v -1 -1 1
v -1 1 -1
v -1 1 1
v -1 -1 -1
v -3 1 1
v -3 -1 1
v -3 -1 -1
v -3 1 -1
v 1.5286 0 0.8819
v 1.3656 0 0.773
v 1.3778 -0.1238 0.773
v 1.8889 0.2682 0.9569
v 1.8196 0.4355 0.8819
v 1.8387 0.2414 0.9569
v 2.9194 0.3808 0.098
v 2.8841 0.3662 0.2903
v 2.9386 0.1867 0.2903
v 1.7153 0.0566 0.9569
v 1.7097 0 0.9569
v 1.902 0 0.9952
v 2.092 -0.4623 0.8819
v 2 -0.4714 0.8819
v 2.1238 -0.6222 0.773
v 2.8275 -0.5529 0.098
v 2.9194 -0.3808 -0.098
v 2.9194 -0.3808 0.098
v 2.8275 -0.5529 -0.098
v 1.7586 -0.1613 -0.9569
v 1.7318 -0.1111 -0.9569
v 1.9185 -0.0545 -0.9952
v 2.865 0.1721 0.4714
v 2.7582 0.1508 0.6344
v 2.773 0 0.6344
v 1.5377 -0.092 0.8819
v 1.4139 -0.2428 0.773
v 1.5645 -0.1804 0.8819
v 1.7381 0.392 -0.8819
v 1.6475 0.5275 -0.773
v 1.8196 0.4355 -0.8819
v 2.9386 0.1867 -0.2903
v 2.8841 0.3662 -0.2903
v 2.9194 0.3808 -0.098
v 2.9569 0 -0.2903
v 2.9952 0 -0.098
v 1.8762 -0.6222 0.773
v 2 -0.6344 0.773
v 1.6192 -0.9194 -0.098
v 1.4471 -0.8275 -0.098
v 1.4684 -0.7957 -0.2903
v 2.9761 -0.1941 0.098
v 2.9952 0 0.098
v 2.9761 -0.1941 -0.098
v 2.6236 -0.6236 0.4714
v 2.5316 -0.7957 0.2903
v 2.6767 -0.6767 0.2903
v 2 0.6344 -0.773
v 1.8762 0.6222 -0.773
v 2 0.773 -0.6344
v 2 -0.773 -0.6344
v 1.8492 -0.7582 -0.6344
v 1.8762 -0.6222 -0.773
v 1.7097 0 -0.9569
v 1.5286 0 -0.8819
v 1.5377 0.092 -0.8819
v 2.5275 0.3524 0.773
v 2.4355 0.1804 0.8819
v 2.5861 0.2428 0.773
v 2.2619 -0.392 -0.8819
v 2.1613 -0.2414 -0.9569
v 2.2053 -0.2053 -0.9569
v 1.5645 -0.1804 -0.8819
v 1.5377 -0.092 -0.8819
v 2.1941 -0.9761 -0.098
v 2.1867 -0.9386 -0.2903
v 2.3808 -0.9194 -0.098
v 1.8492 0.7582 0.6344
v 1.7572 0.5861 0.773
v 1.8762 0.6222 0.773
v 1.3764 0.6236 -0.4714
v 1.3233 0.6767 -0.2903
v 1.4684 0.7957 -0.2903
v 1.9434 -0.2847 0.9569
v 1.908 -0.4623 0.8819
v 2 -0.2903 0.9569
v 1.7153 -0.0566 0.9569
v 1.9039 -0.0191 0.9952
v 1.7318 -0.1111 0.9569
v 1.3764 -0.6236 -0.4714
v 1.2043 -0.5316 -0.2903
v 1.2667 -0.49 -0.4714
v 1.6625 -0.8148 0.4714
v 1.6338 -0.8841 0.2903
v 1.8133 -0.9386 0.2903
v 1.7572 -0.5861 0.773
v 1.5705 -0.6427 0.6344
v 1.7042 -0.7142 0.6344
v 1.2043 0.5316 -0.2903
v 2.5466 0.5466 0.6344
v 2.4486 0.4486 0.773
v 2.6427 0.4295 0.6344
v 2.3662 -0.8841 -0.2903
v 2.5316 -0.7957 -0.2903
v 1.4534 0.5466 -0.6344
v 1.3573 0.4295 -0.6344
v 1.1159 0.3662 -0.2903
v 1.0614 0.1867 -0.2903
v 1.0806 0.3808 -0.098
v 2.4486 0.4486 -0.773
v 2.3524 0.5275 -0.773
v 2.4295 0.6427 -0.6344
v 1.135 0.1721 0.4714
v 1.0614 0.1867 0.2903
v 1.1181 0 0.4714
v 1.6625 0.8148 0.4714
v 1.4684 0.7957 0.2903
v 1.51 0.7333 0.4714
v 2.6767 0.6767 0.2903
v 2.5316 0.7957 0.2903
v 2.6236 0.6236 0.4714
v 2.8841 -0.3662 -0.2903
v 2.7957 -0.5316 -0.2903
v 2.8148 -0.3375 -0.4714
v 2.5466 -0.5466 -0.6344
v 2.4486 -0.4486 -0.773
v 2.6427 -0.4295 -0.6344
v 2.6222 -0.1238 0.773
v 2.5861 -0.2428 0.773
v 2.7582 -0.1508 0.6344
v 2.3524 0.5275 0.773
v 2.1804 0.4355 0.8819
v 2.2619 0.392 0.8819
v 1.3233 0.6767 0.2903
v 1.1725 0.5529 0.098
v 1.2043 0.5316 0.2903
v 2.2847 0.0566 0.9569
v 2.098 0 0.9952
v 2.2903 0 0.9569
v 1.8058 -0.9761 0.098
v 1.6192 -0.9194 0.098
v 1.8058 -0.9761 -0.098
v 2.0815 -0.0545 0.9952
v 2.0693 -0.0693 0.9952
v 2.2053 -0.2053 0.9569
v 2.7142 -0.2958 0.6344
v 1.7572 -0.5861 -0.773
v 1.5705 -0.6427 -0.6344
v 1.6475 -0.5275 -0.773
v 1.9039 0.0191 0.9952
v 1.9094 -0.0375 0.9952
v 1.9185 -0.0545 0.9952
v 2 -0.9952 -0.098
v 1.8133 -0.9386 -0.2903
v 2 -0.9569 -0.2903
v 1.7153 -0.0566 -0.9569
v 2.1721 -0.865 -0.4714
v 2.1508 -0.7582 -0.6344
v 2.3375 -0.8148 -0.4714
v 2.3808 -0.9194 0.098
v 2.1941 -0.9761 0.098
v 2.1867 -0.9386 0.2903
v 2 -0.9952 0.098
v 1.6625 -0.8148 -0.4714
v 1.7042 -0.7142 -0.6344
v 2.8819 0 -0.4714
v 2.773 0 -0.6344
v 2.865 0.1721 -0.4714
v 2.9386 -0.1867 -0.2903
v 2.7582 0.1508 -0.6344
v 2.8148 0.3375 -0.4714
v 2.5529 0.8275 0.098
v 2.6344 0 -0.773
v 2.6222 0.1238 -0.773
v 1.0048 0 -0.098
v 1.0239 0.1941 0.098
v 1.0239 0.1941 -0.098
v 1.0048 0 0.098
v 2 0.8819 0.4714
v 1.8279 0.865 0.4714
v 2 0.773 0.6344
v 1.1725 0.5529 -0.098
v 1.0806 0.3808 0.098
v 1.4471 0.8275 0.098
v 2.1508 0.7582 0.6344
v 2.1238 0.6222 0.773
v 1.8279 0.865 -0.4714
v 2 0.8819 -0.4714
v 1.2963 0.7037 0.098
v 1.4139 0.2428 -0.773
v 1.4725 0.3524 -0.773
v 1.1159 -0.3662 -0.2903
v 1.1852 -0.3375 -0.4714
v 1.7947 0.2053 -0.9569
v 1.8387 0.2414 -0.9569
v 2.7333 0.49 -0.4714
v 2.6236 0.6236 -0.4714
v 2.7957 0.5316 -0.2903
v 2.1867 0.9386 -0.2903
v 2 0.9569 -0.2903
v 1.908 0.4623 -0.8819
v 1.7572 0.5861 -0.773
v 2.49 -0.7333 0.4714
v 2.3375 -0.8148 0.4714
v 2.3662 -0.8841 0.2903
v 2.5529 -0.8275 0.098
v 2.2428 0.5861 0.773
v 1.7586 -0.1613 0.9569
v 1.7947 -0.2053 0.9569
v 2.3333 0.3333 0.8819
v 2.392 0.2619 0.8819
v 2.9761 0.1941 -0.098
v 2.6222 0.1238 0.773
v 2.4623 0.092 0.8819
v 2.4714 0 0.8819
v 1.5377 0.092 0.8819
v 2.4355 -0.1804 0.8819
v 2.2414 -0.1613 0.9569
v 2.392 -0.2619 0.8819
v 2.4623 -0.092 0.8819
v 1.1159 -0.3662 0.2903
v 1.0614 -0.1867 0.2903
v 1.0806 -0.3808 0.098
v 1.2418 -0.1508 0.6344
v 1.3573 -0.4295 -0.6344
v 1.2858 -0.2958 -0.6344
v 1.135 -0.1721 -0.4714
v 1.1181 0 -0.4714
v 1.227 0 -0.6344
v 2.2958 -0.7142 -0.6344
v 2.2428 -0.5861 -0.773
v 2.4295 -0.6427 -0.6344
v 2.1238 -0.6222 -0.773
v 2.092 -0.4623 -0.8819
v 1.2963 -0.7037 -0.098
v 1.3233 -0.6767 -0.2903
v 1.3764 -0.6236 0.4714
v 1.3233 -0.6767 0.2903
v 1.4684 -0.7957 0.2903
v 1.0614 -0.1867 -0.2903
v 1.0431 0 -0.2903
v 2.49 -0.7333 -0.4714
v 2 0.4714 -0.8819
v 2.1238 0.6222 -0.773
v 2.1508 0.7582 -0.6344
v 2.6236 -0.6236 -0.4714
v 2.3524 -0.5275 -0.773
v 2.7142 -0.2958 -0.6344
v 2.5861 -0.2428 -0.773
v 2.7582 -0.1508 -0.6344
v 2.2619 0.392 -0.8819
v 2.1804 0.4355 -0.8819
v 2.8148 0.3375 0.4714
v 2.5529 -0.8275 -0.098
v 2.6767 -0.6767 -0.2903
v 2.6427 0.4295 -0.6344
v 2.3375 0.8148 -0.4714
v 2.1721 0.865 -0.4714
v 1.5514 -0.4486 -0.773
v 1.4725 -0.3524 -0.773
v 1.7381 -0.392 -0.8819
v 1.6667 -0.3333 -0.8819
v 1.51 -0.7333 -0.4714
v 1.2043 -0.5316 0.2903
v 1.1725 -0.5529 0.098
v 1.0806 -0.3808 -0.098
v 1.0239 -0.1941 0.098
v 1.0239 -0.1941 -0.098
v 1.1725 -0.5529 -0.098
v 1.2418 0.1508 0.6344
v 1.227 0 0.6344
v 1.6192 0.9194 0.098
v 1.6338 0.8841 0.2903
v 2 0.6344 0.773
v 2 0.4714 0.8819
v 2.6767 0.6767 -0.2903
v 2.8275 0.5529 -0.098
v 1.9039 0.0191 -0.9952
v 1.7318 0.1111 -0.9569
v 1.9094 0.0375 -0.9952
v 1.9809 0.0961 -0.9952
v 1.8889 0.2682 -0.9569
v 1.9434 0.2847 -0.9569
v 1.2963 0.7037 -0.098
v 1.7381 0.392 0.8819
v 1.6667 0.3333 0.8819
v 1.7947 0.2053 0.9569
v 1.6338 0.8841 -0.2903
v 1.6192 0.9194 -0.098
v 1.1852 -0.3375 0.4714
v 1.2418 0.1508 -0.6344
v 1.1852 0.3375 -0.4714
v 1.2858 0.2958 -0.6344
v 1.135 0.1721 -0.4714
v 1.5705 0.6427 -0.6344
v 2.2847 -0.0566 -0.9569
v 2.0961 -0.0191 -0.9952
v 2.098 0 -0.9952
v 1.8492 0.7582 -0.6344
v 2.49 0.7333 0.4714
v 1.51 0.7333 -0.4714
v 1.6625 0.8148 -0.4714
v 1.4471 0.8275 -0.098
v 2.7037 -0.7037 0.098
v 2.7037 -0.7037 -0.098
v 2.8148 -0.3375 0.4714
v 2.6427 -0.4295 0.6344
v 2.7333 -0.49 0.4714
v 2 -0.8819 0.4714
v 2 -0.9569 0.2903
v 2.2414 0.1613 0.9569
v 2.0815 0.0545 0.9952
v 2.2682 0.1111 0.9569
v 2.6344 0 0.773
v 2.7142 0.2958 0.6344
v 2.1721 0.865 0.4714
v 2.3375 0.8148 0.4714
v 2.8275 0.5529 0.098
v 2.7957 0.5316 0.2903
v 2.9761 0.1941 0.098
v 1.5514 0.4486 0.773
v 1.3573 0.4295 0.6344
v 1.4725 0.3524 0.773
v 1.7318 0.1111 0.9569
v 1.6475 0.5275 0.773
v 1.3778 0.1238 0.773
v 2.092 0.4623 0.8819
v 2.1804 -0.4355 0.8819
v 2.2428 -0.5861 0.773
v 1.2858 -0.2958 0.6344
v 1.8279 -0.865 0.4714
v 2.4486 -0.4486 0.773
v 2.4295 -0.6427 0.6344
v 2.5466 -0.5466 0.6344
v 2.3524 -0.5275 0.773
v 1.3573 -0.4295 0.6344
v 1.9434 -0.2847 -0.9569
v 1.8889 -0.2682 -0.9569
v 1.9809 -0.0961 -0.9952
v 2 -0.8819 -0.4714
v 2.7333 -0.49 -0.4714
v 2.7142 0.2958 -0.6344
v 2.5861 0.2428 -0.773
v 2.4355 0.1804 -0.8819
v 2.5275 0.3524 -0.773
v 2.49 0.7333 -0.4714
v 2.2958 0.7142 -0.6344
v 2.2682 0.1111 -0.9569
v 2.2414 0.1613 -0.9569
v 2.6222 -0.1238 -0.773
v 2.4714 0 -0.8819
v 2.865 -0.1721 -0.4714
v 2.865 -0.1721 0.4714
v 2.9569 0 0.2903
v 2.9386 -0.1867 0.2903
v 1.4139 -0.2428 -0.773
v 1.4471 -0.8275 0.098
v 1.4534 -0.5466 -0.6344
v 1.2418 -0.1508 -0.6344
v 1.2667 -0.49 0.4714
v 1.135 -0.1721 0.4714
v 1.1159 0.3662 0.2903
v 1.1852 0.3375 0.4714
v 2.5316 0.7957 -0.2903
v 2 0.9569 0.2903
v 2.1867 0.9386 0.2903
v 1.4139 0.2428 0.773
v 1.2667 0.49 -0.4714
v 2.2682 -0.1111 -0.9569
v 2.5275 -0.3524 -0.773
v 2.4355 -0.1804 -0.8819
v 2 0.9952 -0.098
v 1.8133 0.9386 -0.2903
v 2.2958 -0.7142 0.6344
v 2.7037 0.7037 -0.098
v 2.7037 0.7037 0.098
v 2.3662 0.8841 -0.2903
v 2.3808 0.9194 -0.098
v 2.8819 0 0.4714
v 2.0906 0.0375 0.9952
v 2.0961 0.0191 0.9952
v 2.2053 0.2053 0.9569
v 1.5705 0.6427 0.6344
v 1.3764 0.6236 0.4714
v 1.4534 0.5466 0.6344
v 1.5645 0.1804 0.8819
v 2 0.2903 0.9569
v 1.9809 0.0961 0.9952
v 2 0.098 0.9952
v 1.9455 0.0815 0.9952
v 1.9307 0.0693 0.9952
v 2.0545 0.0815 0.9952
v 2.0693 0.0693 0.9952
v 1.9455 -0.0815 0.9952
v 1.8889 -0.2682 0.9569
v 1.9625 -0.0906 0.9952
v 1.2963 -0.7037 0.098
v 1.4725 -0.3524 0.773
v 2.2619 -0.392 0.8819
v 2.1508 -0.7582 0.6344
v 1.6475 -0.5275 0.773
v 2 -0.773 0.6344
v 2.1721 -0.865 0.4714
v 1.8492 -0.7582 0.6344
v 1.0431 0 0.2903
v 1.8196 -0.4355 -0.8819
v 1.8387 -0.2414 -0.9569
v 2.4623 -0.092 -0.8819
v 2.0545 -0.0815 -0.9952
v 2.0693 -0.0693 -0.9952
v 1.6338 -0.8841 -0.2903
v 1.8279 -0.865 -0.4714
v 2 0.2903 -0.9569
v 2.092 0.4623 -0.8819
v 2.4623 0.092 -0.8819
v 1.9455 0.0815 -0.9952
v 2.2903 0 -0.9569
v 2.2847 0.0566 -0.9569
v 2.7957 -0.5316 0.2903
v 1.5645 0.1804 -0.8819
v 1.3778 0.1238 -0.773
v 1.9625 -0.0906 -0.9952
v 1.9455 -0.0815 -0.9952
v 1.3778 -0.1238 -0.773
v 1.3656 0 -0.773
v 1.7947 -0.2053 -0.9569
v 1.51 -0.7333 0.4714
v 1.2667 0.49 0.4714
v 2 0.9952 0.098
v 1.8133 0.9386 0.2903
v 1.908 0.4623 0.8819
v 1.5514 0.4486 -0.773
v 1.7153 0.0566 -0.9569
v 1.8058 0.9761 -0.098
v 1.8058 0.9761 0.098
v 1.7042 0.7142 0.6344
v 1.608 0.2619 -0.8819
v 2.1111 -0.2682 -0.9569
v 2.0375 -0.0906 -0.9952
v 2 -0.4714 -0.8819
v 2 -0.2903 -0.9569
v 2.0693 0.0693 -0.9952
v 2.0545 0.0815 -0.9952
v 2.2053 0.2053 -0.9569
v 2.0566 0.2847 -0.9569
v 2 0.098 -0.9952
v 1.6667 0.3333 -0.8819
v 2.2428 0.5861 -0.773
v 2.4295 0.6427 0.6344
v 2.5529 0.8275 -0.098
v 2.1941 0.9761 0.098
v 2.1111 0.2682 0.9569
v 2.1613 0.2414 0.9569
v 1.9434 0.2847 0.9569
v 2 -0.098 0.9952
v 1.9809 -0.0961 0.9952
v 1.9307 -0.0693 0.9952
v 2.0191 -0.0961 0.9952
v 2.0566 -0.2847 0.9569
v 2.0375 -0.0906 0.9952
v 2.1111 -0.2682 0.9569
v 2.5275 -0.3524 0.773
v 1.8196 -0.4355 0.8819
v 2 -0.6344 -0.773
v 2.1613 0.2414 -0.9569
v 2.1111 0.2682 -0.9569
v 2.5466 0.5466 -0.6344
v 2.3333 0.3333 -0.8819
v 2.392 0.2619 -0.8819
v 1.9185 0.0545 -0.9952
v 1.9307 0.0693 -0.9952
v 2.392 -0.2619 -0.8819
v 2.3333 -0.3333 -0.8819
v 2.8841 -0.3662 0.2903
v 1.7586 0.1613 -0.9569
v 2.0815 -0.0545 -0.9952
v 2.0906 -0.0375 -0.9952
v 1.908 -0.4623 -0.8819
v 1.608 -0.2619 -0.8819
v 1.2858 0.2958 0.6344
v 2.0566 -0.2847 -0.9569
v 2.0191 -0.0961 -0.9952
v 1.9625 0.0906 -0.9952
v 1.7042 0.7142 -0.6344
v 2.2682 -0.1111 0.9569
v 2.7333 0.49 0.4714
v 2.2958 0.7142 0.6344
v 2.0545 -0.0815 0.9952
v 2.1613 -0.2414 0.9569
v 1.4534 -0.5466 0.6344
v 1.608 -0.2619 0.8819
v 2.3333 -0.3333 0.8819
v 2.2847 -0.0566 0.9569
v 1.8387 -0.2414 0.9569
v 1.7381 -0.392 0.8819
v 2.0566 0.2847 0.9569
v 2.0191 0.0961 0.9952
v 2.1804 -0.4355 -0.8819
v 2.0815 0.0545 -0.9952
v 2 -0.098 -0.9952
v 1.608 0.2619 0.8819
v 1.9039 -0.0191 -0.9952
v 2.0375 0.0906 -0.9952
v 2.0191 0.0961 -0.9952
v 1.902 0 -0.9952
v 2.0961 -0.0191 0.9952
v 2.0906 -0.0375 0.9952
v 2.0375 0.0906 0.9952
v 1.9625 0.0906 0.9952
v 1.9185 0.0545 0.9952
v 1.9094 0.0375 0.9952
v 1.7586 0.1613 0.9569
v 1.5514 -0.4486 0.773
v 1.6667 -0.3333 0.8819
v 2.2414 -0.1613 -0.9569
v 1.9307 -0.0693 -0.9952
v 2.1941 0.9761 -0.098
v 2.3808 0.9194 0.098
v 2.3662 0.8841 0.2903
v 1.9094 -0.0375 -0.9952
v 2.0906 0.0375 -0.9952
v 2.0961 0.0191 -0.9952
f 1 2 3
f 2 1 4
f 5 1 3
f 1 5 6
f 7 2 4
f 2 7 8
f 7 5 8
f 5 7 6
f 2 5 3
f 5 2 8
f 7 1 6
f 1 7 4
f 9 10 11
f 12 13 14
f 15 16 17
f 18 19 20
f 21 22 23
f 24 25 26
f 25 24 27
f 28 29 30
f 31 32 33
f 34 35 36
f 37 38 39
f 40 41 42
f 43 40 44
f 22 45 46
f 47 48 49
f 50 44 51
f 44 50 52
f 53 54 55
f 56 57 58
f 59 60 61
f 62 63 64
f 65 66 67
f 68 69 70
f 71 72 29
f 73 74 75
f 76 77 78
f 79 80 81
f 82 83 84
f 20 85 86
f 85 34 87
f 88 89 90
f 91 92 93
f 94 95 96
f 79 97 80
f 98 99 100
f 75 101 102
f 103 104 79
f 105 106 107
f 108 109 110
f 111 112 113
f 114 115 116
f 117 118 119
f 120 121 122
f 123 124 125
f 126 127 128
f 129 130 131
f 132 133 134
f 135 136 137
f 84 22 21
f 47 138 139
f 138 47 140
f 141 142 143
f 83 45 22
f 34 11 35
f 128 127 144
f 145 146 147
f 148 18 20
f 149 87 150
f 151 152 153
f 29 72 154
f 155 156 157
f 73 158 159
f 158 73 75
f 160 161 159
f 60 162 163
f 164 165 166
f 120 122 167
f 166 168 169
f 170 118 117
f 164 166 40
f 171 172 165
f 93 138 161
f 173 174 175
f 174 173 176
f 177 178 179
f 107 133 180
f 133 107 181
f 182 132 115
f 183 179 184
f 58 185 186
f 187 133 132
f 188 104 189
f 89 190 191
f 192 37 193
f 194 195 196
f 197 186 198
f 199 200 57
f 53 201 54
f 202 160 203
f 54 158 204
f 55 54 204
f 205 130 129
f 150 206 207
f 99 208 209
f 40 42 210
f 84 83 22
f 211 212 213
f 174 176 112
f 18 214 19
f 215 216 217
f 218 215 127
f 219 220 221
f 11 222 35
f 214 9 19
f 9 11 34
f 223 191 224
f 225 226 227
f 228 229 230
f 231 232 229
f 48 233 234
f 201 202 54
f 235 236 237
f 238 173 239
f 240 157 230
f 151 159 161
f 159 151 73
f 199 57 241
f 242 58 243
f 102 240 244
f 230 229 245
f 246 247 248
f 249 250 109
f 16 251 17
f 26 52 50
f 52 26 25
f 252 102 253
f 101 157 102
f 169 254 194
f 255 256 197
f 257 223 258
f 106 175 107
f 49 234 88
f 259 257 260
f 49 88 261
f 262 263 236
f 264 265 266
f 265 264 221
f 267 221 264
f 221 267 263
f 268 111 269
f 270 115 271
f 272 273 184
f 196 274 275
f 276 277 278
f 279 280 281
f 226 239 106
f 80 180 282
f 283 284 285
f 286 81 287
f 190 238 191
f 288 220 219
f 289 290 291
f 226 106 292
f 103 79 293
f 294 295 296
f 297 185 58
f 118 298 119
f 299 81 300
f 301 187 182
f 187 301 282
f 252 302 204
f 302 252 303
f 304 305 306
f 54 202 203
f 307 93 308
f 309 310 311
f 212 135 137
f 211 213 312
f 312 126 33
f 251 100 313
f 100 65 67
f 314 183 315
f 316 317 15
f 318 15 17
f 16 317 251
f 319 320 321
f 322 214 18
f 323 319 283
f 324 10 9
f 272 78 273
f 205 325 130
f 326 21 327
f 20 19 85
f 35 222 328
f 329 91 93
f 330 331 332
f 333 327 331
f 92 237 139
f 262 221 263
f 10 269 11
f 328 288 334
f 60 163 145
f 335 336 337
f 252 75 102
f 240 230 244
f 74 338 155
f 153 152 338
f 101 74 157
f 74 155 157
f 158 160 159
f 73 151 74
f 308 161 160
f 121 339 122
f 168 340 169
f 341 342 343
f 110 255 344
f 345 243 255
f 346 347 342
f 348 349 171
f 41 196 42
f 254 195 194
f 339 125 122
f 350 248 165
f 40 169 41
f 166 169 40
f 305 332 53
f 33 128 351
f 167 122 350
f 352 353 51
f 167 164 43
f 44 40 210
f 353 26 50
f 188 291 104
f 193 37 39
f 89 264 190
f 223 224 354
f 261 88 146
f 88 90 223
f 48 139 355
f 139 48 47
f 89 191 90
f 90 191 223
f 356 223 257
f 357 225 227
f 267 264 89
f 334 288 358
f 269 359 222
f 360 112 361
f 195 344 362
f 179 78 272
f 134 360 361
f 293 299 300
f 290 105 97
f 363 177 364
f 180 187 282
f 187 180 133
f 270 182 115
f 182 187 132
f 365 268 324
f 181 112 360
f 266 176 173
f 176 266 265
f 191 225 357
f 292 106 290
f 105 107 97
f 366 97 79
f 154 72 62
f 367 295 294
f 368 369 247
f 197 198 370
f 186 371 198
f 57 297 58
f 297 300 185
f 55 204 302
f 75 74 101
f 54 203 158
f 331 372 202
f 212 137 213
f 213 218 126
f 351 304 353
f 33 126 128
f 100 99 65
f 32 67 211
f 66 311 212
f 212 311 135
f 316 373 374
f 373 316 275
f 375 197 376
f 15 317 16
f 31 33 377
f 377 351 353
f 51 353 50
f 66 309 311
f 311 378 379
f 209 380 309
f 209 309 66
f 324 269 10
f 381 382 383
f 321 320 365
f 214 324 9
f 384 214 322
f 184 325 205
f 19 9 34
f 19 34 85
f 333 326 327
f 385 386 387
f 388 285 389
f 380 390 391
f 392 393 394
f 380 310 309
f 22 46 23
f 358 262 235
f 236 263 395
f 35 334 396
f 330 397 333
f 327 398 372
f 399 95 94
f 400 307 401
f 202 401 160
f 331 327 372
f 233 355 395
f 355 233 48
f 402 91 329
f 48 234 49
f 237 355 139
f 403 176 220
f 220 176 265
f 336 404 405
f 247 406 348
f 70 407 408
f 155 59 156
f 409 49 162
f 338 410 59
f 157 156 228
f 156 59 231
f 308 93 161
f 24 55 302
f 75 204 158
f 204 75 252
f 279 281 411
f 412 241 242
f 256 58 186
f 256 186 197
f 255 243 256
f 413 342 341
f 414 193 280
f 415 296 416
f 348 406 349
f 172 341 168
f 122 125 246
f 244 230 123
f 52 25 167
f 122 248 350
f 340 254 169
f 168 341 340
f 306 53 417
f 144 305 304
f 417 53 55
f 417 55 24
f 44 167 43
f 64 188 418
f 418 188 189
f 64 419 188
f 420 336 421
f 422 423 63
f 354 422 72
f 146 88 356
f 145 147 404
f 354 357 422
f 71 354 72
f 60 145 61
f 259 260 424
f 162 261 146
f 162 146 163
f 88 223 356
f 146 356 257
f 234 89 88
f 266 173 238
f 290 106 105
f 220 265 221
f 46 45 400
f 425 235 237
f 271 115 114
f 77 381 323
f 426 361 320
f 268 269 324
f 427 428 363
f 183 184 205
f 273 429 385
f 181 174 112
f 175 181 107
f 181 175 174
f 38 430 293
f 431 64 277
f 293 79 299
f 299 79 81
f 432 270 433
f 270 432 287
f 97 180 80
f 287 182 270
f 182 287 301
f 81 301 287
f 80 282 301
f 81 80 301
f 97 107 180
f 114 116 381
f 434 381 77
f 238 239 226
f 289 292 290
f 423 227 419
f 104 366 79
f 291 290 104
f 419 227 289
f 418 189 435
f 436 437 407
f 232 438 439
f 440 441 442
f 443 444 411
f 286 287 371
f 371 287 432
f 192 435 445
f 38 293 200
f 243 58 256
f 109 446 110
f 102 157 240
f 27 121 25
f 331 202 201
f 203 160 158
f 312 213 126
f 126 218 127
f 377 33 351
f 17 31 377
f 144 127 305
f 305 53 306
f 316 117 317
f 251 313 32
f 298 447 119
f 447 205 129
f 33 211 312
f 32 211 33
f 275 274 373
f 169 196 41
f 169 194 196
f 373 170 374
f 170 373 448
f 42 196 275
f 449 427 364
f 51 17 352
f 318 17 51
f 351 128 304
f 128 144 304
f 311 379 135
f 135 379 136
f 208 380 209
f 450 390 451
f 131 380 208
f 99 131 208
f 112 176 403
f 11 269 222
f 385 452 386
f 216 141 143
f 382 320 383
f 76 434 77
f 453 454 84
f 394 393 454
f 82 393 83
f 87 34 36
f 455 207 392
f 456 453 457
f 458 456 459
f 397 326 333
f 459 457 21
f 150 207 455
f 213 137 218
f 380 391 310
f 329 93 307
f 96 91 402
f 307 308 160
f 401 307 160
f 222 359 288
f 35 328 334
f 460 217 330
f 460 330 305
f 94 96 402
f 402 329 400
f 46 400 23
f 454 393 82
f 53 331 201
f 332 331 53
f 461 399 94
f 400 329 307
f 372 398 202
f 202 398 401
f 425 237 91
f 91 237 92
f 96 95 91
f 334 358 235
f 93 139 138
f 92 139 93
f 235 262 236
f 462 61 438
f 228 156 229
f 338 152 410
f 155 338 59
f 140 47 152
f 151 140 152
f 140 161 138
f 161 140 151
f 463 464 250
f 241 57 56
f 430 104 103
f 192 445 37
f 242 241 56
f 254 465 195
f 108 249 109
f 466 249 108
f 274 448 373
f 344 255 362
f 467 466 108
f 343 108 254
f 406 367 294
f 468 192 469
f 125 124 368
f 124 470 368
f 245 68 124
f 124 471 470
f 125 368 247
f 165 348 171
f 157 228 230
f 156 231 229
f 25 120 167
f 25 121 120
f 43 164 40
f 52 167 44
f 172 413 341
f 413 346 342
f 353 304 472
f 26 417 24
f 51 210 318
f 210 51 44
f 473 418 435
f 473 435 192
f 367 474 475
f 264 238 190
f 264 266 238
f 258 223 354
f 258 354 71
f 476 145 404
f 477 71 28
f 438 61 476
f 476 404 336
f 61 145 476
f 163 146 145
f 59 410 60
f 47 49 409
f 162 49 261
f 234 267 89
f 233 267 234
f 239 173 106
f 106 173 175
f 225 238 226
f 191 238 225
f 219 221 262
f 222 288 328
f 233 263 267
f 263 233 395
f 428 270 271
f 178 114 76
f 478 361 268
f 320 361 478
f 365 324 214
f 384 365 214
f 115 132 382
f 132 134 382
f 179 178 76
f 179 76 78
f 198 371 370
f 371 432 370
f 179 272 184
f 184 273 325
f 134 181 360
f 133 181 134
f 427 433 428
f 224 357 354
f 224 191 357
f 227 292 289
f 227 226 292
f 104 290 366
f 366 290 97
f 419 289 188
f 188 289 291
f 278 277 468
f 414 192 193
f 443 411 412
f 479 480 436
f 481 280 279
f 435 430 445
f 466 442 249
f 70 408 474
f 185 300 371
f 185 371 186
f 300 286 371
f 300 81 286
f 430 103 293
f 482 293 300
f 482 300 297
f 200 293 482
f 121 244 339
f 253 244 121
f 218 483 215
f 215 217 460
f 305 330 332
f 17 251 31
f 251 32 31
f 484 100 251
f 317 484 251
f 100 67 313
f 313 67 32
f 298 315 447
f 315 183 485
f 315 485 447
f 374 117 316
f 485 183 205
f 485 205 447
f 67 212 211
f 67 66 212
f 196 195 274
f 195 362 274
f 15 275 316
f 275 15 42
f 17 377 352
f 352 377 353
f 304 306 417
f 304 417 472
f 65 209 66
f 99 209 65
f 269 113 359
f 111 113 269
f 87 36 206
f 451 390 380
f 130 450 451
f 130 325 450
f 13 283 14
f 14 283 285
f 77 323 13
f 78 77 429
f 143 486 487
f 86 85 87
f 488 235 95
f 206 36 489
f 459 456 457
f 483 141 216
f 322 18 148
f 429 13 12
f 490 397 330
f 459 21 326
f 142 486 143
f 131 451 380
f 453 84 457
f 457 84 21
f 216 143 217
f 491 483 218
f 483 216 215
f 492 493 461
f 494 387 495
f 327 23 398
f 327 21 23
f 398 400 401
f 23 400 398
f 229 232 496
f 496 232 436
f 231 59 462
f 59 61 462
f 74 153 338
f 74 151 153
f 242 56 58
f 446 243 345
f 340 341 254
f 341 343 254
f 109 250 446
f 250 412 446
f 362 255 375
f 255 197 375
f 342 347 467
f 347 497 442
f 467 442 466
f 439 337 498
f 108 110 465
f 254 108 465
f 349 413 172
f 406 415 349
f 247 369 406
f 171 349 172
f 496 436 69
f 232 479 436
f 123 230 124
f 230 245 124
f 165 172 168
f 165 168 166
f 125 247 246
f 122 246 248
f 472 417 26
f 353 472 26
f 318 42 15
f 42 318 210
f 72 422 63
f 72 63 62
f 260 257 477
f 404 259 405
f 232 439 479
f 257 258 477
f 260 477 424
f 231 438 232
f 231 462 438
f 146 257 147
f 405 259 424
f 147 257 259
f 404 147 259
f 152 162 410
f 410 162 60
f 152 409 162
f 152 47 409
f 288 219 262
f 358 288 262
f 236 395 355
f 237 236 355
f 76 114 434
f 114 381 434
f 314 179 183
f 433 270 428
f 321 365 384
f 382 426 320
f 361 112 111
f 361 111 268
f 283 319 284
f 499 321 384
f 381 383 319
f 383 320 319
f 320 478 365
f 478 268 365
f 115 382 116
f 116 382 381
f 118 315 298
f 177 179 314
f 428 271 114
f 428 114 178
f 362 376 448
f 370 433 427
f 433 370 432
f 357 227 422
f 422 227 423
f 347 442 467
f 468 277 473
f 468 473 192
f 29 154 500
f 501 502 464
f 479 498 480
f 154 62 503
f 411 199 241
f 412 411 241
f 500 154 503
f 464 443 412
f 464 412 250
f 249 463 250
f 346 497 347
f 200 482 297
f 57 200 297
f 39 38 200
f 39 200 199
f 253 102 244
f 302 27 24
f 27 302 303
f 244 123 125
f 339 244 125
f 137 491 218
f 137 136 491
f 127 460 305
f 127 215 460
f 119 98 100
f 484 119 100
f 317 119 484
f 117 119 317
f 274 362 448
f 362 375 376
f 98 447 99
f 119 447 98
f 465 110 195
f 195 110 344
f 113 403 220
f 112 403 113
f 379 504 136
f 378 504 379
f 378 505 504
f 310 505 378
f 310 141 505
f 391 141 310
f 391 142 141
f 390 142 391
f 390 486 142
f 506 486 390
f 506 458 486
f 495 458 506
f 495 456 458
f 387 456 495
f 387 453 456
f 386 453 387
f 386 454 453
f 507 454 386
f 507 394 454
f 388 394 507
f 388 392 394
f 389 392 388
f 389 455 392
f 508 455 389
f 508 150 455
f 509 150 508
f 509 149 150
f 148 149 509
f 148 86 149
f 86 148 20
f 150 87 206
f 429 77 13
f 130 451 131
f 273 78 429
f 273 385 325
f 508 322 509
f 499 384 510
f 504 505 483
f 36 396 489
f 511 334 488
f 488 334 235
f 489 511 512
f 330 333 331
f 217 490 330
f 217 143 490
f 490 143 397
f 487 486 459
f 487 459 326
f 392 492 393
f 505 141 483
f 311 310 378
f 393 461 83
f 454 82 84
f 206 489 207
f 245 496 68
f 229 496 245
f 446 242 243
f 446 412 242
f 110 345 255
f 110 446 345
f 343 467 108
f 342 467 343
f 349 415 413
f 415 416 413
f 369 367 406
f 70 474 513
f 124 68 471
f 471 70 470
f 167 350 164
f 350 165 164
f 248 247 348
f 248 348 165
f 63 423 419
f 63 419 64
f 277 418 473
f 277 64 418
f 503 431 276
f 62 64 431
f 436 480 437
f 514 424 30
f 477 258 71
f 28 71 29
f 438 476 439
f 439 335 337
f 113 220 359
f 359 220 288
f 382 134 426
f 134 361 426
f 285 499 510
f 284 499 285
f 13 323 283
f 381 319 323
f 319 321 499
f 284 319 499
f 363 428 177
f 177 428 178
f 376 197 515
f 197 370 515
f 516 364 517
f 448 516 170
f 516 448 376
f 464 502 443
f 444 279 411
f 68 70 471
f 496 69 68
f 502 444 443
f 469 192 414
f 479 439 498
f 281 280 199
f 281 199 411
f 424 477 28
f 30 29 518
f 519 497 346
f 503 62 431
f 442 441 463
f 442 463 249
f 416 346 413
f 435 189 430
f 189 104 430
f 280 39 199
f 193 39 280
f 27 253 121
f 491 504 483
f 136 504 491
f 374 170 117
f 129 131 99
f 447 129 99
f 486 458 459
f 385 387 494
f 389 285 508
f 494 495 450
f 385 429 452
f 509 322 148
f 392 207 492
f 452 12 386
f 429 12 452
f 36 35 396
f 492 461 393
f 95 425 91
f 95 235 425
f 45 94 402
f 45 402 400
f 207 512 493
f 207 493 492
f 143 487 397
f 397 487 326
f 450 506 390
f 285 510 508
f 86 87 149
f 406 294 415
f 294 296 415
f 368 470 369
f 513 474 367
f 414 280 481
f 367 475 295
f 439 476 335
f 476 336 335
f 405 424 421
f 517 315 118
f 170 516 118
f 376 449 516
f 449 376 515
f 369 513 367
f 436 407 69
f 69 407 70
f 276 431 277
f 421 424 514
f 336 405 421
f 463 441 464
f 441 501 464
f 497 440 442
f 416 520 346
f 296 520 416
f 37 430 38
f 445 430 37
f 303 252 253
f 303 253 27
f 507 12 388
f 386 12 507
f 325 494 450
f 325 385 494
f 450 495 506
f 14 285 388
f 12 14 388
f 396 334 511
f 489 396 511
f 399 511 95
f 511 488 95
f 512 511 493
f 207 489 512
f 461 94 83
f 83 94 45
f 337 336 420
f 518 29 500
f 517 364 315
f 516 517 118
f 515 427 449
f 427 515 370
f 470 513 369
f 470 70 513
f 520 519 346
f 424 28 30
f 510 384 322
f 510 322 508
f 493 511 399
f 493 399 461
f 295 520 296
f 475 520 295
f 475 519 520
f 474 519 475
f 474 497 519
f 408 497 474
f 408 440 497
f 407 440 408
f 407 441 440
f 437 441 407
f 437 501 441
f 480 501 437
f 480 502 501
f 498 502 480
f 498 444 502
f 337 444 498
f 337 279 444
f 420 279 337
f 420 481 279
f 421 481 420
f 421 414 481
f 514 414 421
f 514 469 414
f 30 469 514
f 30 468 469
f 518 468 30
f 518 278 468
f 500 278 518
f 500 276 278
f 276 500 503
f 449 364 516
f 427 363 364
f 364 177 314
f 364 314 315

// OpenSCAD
$fn = 32;
scenario = "disjoint_union";

module disjoint_union() {
    union() {
        translate([-2, 0, 0]) cube([2, 2, 2], center = true);
        translate([2, 0, 0]) sphere(r = 1.0);
    }
}

module overlap_intersection() {
    intersection() {
        cube([2, 2, 2], center = true);
        translate([0.4, 0, 0]) sphere(r = 1.35);
    }
}

module containment_difference() {
    difference() {
        cube([3, 3, 3], center = true);
        sphere(r = 0.75);
    }
}

module face_tangent_union() {
    union() {
        translate([-1, 0, 0]) cube([2, 2, 2], center = true);
        translate([1, 0, 0]) cube([2, 2, 2], center = true);
    }
}

module edge_tangent_union() {
    union() {
        translate([-1, -1, 0]) cube([2, 2, 2], center = true);
        translate([1, 1, 0]) cube([2, 2, 2], center = true);
    }
}

module vertex_tangent_union() {
    union() {
        translate([-1, -1, -1]) cube([2, 2, 2], center = true);
        translate([1, 1, 1]) cube([2, 2, 2], center = true);
    }
}

module offset_cylinder_union() {
    union() {
        sphere(r = 1.2);
        translate([0.35, -0.15, 0.0]) cylinder(h = 2.6, r = 0.55, center = true);
    }
}

module many_reductions_union() {
    union() {
        for (i = [-1:1]) {
            for (j = [-1:1]) {
                translate([i * 0.9, j * 0.9, 0]) sphere(r = 0.45);
            }
        }

        for (i = [-1:1]) {
            translate([i * 1.2, 0, 0]) cylinder(h = 2.0, r = 0.3, center = true);
            translate([0, i * 1.2, 0]) cylinder(h = 2.0, r = 0.3, center = true);
        }
    }
}

if (scenario == "disjoint_union") {
    disjoint_union();
} else if (scenario == "overlap_intersection") {
    overlap_intersection();
} else if (scenario == "containment_difference") {
    containment_difference();
} else if (scenario == "face_tangent_union") {
    face_tangent_union();
} else if (scenario == "edge_tangent_union") {
    edge_tangent_union();
} else if (scenario == "vertex_tangent_union") {
    vertex_tangent_union();
} else if (scenario == "offset_cylinder_union") {
    offset_cylinder_union();
} else if (scenario == "many_reductions_union") {
    many_reductions_union();
} else {
    assert(false, str("Unknown scenario: ", scenario));
}
